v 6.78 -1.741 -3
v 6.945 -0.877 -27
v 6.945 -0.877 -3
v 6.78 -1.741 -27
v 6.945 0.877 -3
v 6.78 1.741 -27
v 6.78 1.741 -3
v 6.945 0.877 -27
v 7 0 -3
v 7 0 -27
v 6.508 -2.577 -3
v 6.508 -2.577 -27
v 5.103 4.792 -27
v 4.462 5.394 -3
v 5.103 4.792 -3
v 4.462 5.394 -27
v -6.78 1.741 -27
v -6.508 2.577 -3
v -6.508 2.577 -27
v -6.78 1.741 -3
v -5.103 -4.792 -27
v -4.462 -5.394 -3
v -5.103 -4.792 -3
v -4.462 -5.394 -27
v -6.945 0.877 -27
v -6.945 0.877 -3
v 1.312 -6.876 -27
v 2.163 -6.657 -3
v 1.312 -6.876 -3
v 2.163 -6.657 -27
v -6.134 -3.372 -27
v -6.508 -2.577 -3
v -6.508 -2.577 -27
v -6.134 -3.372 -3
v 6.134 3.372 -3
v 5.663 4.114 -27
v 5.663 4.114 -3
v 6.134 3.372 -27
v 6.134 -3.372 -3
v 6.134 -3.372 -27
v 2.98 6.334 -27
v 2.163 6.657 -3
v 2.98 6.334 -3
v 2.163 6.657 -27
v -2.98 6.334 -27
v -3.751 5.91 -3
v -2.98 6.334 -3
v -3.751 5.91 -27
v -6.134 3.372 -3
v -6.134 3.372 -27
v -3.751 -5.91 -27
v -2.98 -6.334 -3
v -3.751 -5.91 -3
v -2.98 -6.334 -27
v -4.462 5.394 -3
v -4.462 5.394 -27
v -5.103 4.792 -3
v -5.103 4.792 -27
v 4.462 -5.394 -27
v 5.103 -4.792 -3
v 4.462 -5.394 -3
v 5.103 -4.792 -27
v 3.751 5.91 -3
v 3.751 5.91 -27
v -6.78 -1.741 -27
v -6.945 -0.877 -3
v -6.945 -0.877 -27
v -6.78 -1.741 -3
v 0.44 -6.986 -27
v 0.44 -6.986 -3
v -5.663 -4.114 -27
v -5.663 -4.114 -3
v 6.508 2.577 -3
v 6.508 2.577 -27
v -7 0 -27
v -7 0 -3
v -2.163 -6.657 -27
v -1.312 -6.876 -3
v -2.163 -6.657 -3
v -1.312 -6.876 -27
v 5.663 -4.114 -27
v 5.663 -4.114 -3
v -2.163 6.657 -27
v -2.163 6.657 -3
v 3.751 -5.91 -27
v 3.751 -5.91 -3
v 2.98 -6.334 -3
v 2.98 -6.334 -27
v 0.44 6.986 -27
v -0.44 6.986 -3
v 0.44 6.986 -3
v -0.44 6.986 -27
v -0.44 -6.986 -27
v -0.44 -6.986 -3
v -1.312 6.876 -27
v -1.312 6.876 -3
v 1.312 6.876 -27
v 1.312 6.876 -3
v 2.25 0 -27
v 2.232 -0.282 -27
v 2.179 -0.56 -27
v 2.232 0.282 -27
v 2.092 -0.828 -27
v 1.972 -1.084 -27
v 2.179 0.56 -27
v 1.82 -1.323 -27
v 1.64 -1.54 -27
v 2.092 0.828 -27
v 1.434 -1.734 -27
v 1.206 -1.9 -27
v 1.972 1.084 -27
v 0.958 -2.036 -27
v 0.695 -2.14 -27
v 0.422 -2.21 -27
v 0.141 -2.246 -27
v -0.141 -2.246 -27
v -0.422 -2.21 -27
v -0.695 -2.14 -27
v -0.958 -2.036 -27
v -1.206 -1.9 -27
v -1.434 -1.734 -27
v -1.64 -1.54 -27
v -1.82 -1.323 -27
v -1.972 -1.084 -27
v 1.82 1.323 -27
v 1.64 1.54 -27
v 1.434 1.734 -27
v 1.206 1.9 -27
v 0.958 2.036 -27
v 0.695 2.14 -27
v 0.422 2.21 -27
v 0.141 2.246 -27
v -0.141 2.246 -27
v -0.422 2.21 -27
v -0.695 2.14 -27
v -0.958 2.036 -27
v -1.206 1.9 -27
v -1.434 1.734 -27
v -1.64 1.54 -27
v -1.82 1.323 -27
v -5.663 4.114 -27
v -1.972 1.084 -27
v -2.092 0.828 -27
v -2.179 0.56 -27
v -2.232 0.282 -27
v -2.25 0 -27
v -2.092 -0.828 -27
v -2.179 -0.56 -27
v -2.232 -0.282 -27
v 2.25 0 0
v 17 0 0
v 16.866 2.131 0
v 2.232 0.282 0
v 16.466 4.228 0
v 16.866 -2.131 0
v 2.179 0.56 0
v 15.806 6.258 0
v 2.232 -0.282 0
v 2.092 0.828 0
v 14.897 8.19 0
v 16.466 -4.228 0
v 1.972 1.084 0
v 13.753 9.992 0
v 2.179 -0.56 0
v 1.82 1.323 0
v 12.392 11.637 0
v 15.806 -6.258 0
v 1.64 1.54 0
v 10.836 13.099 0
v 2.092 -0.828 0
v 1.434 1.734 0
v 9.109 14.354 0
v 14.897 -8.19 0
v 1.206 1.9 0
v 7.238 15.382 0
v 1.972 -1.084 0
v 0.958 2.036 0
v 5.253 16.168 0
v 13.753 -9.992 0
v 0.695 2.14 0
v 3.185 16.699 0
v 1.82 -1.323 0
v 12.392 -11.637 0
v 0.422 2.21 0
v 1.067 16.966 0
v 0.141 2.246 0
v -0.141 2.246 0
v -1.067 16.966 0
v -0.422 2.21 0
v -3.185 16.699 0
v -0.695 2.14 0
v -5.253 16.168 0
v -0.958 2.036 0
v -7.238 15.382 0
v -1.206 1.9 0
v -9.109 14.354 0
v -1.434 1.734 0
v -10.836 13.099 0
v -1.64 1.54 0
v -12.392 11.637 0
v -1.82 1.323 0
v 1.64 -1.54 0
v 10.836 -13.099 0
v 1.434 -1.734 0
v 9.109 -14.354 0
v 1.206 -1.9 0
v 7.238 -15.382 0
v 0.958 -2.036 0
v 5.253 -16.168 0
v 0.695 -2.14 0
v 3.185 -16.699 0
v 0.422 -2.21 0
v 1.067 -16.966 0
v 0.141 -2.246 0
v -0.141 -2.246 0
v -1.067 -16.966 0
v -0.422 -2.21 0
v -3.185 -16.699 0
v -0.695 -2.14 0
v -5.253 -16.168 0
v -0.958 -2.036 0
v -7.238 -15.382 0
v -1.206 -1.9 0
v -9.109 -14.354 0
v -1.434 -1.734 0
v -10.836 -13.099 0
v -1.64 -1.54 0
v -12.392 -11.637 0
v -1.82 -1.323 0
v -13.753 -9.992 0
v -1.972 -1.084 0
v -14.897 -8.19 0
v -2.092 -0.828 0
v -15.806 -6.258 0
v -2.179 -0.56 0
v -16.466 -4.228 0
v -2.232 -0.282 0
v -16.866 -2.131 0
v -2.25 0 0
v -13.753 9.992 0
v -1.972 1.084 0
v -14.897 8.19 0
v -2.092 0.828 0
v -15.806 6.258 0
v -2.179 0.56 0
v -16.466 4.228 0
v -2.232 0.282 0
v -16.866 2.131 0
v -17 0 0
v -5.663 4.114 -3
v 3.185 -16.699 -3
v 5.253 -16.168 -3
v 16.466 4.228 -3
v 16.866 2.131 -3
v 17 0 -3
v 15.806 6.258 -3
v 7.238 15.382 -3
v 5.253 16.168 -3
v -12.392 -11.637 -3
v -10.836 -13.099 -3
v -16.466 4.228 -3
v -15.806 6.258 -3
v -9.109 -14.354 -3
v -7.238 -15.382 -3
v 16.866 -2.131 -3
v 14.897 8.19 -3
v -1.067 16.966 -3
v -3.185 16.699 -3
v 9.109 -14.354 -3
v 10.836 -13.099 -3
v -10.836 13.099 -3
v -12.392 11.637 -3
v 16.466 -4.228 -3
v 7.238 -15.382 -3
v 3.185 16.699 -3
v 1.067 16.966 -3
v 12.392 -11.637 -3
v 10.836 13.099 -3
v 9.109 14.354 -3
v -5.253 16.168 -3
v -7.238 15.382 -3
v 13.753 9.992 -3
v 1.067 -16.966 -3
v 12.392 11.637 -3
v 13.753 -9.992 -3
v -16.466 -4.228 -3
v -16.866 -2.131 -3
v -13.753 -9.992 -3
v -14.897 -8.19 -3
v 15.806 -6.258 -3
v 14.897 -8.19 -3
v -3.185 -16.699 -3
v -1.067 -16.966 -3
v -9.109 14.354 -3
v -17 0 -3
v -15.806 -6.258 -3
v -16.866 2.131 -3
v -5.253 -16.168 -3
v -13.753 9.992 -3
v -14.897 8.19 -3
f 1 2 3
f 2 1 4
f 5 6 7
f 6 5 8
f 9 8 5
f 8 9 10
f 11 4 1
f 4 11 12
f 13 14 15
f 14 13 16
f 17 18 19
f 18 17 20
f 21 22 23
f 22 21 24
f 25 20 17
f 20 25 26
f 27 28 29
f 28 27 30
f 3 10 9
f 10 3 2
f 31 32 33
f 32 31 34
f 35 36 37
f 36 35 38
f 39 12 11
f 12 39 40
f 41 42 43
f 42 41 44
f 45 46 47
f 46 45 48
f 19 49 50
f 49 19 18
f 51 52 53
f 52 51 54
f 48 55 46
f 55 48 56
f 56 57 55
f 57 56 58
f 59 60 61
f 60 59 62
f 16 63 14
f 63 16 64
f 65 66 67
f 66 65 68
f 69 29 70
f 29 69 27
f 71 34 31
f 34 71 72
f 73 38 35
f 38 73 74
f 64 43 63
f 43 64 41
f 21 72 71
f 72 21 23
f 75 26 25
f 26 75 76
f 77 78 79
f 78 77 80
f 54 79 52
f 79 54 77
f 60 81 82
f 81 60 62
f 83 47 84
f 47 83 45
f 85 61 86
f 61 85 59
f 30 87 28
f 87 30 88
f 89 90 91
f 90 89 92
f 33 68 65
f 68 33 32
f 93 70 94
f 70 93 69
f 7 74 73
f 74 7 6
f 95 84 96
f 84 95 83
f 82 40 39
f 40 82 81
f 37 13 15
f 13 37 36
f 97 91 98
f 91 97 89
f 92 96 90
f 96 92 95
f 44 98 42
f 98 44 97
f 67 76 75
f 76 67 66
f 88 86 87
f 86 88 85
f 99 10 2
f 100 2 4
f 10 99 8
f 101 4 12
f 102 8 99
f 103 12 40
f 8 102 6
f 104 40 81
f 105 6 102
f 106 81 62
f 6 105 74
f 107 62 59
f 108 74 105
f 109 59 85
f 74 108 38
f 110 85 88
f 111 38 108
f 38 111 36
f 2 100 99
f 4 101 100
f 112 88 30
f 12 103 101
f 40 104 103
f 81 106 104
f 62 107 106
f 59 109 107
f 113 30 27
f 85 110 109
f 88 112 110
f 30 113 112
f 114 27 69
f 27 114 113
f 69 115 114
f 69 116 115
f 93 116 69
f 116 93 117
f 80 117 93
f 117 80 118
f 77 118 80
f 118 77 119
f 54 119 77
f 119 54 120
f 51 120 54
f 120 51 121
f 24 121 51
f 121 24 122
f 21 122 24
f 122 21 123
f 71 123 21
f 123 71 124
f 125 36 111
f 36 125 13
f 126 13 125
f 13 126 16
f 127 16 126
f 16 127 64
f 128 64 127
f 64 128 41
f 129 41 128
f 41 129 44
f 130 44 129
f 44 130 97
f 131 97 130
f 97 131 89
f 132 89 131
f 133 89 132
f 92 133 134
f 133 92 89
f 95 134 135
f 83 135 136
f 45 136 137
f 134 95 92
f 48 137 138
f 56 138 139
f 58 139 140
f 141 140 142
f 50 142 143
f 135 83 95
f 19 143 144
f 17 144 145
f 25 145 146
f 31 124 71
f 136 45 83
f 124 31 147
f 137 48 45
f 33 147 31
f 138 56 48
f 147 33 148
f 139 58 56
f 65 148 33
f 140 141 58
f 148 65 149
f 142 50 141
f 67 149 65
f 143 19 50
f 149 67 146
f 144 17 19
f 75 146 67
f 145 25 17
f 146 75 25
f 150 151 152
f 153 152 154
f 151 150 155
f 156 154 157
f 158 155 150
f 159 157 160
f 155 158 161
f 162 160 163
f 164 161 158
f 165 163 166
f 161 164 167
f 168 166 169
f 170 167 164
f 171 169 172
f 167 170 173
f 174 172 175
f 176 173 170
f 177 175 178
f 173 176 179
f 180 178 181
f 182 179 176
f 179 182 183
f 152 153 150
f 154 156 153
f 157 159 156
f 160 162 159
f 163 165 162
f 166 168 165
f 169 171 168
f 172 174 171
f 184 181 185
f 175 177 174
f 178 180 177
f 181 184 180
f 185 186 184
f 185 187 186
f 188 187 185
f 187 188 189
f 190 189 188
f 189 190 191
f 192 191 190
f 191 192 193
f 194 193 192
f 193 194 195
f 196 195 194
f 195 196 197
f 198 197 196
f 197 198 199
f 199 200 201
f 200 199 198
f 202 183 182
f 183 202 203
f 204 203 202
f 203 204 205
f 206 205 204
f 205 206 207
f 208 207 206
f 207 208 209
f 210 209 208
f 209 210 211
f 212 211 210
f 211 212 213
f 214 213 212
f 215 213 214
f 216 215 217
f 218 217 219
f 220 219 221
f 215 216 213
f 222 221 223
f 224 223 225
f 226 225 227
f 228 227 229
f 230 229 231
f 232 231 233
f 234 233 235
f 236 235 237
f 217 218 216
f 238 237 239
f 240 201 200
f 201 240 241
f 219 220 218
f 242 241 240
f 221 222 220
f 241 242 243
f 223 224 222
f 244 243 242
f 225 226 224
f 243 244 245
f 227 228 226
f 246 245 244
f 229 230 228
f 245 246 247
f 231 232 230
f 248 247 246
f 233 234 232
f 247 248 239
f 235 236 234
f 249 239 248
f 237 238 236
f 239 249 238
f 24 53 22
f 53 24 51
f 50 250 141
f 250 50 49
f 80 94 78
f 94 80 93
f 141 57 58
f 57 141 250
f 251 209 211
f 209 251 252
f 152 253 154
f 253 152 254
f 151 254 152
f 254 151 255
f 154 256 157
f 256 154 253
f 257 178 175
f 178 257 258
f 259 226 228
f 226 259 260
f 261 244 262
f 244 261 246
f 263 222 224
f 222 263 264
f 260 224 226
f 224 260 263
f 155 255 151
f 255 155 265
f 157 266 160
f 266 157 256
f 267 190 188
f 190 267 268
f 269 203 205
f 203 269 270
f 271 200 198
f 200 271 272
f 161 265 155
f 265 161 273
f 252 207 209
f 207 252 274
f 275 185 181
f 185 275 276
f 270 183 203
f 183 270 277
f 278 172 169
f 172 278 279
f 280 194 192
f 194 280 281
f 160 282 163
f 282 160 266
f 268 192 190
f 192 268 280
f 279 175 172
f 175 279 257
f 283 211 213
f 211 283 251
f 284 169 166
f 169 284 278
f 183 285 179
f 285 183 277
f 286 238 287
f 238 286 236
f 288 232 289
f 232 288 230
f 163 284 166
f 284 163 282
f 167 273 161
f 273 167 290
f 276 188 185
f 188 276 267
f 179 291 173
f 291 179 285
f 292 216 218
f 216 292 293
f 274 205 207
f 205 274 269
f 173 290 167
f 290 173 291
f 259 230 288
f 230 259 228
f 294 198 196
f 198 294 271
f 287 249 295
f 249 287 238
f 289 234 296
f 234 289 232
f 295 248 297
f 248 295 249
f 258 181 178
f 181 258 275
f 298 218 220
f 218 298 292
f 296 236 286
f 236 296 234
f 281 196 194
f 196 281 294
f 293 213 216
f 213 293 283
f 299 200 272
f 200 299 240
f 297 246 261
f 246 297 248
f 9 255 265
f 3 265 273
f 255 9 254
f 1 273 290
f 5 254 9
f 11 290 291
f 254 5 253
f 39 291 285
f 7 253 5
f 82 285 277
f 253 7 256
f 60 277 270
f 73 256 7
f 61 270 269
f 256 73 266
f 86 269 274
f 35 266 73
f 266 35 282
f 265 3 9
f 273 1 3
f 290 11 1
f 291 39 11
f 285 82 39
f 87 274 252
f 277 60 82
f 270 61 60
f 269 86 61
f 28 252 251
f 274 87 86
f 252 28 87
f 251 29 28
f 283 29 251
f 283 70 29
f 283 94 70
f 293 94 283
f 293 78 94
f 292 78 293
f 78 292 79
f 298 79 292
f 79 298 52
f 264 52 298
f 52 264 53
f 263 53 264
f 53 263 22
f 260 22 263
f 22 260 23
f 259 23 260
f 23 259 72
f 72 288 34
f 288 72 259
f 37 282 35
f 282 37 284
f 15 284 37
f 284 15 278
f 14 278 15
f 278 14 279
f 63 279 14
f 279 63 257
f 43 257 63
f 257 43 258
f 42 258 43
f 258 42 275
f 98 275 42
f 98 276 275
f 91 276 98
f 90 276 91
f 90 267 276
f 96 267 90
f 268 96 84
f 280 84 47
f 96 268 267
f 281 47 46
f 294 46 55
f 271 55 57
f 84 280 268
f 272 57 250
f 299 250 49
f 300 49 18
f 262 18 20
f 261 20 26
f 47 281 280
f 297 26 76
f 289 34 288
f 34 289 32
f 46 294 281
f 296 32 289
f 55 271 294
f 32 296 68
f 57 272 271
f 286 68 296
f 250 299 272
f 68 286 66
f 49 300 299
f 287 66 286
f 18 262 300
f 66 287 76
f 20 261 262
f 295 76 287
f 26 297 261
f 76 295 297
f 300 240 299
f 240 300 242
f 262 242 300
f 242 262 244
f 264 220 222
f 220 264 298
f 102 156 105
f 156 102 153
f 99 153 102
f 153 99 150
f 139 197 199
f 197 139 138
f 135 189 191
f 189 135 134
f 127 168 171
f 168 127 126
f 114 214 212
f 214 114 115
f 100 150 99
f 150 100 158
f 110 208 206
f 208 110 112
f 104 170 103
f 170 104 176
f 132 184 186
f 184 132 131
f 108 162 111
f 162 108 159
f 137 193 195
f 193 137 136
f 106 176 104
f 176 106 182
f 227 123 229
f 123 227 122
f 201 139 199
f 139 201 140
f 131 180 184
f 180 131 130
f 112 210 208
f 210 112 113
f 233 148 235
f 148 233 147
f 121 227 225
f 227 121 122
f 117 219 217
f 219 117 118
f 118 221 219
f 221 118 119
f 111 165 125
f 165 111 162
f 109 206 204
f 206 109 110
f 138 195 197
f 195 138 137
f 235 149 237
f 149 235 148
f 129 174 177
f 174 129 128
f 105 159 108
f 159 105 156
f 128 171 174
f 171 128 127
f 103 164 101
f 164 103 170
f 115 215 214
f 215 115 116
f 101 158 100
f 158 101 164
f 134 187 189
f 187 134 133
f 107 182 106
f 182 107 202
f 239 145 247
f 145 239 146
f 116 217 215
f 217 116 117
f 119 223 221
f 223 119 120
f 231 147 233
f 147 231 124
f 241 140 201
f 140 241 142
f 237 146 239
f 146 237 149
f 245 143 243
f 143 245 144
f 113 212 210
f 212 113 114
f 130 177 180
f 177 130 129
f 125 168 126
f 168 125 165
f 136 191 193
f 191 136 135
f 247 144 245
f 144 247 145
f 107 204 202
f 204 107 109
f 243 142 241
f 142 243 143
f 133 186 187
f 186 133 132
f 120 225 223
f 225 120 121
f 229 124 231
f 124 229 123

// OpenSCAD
$fn = 50;


difference() {
	union() {
		translate(v = [0, 0, -27.0000000000]) {
			cylinder(h = 27, r = 7.0000000000);
		}
		translate(v = [0, 0, -3.0000000000]) {
			cylinder(h = 3, r = 17.0000000000);
		}
	}
	union() {
		#translate(v = [0, 0, -27]) {
			cylinder(h = 27, r = 2.2500000000);
		}
	}
}
